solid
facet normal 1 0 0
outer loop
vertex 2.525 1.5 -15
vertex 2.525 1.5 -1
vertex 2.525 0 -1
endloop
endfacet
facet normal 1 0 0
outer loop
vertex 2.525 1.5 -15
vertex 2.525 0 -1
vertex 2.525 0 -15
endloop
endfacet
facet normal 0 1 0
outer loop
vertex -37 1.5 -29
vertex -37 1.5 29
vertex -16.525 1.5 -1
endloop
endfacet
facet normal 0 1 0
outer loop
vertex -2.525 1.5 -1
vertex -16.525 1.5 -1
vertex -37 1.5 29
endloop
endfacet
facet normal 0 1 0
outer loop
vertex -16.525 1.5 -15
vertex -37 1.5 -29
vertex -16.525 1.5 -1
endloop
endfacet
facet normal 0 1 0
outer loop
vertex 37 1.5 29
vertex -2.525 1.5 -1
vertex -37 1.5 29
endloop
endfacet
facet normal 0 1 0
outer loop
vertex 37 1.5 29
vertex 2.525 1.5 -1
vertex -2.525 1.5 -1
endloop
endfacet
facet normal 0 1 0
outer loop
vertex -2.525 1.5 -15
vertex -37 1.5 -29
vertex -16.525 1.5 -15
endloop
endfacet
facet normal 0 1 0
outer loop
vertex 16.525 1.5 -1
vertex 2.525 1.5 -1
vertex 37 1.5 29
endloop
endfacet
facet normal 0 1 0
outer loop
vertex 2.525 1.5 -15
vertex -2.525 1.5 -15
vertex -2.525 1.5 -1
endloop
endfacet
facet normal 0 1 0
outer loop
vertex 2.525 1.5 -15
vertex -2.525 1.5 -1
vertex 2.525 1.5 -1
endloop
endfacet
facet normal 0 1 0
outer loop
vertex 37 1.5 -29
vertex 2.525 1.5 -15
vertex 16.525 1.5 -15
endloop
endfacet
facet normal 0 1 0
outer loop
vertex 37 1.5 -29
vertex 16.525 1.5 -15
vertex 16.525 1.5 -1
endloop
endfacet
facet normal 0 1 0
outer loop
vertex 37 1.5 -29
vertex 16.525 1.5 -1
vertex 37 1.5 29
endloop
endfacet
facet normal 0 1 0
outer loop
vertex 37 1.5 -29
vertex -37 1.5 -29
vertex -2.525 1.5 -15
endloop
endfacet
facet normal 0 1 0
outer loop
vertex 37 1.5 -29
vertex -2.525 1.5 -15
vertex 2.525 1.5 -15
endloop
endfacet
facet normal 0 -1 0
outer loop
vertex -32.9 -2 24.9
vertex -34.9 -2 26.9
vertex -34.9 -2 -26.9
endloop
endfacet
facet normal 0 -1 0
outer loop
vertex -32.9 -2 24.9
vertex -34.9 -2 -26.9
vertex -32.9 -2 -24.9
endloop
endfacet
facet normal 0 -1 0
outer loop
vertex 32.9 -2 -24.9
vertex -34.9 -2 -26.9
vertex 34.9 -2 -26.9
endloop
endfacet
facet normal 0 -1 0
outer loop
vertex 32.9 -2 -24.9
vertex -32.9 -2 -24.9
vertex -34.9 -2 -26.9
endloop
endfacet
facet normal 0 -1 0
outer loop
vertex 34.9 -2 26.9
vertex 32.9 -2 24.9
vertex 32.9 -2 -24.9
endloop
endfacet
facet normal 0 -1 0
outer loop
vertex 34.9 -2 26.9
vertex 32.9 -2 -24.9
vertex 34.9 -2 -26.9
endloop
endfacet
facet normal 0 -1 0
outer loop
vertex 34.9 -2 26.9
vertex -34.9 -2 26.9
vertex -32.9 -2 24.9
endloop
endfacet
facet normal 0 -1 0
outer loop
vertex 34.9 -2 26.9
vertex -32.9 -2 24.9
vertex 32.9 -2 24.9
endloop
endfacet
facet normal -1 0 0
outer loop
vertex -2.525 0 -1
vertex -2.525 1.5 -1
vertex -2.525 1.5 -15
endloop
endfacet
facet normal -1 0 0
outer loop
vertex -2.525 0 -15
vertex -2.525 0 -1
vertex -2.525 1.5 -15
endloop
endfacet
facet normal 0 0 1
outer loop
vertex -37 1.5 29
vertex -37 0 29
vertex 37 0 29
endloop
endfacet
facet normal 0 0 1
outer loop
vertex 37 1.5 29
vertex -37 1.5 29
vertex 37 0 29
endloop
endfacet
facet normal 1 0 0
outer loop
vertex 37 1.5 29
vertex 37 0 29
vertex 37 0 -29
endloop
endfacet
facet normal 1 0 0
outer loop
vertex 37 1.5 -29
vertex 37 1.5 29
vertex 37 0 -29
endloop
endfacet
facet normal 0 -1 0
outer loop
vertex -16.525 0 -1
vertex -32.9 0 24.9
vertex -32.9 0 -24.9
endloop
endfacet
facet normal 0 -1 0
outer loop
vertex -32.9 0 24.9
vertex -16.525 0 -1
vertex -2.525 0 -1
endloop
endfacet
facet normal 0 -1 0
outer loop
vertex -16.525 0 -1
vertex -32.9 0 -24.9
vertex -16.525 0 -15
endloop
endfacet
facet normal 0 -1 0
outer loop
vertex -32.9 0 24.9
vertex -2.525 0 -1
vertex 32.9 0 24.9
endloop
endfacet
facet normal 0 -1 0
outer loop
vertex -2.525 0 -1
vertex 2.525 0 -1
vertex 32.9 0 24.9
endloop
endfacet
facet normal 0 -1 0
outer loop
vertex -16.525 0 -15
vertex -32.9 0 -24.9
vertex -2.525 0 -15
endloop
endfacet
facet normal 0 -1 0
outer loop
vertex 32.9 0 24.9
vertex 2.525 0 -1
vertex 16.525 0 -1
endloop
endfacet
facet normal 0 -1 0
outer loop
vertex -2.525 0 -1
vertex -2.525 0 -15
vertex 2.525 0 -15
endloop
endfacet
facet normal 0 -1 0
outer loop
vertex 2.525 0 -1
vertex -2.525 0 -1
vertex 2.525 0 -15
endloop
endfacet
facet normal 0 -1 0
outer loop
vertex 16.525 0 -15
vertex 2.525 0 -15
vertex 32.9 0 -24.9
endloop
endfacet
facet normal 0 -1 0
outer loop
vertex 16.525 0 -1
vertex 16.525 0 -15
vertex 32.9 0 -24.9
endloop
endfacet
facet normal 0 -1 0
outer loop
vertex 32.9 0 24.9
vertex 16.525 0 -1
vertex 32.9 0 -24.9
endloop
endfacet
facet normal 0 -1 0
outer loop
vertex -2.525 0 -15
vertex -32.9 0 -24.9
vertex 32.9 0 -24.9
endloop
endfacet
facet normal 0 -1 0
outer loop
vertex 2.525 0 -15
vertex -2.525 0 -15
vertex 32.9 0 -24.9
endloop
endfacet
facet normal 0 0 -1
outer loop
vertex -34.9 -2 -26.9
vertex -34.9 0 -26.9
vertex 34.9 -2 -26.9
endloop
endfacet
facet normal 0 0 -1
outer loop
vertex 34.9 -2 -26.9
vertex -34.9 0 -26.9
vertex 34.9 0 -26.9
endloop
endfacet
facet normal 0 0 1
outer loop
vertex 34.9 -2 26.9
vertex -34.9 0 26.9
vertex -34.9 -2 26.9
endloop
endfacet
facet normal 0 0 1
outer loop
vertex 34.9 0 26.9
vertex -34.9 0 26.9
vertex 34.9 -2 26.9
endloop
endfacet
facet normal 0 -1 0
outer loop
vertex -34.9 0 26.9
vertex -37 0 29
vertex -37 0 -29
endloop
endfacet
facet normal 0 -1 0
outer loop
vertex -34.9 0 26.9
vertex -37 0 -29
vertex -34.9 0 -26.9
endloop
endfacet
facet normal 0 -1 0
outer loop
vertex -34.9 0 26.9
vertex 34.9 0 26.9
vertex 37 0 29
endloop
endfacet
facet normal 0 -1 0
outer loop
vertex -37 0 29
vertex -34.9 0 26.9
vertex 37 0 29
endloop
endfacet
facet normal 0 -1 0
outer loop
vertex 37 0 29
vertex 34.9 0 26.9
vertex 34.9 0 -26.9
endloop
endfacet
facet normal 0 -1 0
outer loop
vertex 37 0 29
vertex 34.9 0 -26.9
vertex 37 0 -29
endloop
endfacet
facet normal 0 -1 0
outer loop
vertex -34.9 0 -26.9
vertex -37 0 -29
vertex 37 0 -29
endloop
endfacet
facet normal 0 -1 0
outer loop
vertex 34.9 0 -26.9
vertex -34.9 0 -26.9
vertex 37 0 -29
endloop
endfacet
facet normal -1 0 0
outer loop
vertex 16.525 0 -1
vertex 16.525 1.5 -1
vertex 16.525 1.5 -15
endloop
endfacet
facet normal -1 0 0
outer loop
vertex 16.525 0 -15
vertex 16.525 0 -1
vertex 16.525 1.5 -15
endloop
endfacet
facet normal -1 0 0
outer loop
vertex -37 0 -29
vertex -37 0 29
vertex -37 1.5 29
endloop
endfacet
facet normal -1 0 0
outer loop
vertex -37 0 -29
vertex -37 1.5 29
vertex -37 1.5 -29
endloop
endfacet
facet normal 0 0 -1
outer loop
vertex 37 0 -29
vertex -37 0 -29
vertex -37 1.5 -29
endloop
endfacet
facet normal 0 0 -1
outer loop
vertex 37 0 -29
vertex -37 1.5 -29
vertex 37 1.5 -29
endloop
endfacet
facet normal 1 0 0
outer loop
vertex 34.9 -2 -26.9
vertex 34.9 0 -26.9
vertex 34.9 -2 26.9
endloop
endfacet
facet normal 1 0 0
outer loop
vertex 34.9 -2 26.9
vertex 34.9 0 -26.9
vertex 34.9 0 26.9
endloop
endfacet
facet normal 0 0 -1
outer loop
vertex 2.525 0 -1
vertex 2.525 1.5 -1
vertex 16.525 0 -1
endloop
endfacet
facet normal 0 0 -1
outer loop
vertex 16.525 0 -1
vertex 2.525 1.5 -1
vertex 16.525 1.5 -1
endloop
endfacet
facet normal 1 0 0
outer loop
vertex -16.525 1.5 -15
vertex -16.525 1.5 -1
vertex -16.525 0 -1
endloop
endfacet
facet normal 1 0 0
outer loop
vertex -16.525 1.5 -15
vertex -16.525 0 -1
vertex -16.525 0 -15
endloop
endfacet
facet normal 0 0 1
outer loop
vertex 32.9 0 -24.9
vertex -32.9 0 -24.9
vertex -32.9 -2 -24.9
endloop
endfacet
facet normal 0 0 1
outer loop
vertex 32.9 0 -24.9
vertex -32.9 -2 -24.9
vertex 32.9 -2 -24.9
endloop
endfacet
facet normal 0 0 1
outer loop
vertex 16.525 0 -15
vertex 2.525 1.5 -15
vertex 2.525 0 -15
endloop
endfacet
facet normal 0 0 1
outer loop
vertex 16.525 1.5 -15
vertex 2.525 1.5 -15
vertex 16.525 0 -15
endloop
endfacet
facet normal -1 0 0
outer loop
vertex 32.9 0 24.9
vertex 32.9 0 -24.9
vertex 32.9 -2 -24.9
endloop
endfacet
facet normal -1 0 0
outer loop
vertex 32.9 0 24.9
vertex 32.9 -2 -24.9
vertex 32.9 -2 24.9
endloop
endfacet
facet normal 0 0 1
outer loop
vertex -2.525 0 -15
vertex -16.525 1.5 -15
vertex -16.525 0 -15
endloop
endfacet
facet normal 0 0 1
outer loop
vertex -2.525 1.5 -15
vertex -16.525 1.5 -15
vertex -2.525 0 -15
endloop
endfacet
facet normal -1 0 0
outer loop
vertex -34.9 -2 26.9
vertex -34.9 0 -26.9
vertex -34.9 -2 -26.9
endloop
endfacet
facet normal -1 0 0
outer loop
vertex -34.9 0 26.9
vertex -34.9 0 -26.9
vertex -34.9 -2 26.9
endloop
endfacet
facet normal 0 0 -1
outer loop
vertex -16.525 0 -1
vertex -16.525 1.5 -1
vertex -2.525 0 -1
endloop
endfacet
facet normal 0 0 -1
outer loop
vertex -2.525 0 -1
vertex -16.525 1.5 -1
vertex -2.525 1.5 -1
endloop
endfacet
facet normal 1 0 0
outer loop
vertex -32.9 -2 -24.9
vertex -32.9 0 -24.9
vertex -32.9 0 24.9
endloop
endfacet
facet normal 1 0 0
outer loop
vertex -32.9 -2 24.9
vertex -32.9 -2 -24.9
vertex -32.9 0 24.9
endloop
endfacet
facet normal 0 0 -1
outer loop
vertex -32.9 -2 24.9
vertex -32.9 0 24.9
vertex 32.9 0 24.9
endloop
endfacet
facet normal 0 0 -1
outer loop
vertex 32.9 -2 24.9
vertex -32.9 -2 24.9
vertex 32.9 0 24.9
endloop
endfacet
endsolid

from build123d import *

# Parameters (mm, degrees)
IZIM1_W                     = 74
IZIM1_H                     = 58
Y_KSEKLIK_EKSTR_ZYON1_DEPTH = 1.5
IZIM2_W                     = 69.8
IZIM2_H                     = 53.8
IZIM2_W_2                   = 65.8
IZIM2_H_2                   = 49.8
EKSTR_ZYON_NCE1_DEPTH       = 2
IZIM4_W                     = 14
IZIM4_H                     = 14
KES_EKSTR_ZYON4_DEPTH       = 2


with BuildPart() as part:
    # Çizim1 → Yükseklik-Ekstrüzyon1 (new body)
    with BuildSketch(Plane(origin=(0, 0, 0), x_dir=(1, 0, 0), z_dir=(0, 1, 0))):
        Rectangle(IZIM1_W, IZIM1_H)
    extrude(amount=Y_KSEKLIK_EKSTR_ZYON1_DEPTH)

    # Çizim2 → Ekstrüzyon-İnce1 (add)
    with BuildSketch(Plane.XZ):
        Rectangle(IZIM2_W, IZIM2_H)
        Rectangle(IZIM2_W_2, IZIM2_H_2, mode=Mode.SUBTRACT)
    extrude(amount=EKSTR_ZYON_NCE1_DEPTH)

    # Çizim4 → Kes-Ekstrüzyon4 (cut)
    with BuildSketch(Plane(origin=(0, 1.5, 0), x_dir=(1, 0, 0), z_dir=(0, 1, 0))):
        with Locations((-9.525, 8)):
            Rectangle(IZIM4_W, IZIM4_H)
        with Locations((9.525, 8)):
            Rectangle(IZIM4_W, IZIM4_H)
    extrude(amount=-KES_EKSTR_ZYON4_DEPTH, mode=Mode.SUBTRACT)


solid = part.part
